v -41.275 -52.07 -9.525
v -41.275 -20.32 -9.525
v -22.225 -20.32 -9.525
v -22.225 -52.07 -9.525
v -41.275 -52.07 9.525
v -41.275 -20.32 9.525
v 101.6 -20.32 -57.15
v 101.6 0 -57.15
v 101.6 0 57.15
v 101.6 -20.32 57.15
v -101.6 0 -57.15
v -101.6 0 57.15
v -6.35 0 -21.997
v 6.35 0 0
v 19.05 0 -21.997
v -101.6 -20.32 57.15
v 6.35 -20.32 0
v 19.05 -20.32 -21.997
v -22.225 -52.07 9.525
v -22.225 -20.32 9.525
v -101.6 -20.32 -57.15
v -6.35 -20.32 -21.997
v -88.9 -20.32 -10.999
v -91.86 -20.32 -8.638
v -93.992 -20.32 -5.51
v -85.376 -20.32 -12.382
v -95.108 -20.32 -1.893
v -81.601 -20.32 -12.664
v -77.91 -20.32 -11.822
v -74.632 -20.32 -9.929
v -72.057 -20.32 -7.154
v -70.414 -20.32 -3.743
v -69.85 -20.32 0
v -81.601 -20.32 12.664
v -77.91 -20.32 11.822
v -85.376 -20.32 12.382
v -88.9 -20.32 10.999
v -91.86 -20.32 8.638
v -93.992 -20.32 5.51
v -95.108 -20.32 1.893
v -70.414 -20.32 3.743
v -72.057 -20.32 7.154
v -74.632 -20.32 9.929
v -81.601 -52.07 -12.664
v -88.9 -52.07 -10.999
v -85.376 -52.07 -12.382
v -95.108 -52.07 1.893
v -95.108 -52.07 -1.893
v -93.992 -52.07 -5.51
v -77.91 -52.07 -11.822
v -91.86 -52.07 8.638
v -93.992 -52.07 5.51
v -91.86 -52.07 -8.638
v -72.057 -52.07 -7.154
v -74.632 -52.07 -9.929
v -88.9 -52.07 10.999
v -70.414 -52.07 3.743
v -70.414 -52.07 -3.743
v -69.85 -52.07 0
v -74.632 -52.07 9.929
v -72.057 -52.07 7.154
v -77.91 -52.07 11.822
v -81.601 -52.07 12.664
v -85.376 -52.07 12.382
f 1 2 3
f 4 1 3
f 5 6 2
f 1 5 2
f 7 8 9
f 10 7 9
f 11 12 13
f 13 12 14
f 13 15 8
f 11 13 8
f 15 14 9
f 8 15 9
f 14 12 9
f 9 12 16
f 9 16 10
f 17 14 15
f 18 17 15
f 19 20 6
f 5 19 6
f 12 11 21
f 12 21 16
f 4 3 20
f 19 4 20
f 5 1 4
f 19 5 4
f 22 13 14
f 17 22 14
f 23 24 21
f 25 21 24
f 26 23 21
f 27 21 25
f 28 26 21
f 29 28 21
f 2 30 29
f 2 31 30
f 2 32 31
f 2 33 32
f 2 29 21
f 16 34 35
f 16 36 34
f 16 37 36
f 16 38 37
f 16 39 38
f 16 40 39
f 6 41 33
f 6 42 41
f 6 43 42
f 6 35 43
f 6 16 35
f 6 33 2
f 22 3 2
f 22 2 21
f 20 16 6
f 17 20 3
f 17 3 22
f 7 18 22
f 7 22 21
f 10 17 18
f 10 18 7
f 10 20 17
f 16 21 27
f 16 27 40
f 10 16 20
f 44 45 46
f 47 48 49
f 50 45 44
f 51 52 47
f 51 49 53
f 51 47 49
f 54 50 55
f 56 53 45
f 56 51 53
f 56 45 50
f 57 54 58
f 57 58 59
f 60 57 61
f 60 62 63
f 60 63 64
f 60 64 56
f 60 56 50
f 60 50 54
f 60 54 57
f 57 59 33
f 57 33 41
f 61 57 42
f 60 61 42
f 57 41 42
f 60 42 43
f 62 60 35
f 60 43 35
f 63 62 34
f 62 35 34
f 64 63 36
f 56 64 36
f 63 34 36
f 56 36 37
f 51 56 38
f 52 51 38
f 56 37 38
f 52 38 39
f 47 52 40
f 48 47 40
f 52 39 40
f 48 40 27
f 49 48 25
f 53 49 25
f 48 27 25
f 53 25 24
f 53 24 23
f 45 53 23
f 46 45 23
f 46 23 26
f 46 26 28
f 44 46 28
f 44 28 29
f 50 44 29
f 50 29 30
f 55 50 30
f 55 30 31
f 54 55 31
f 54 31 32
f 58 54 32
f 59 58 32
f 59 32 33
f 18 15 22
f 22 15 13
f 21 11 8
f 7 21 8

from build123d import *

# Parameters (mm, degrees)
F0_W     = 203.2
F0_H     = 114.3
F0_R     = 12.7
F1_DEPTH = 20.32
F2_DEPTH = 52.07


with BuildPart() as f1:
    # F0 (on Front) → F1 (new body)
    with BuildSketch(Plane.XZ):
        Rectangle(F0_W, F0_H)
        Polygon((-6.35, -21.997045), (6.35, 0), (19.05, -21.997045), align=None, mode=Mode.SUBTRACT)
        with Locations((-82.55, 0)):
            Circle(F0_R, mode=Mode.SUBTRACT)
        Polygon((-22.225, 9.525), (-22.225, 0), (-22.225, -9.525), (-41.275, -9.525), (-41.275, 0), (-41.275, 9.525), align=None, mode=Mode.SUBTRACT)
    extrude(amount=F1_DEPTH)

    # F0 (on Front) → F2 (join)
    with BuildSketch(Plane.XZ):
        with Locations((-82.55, 0)):
            Circle(F0_R)
        Polygon((-31.75, 0), (-22.225, 0), (-22.225, 9.525), (-41.275, 9.525), (-41.275, 0), align=None)
        Polygon((-22.225, -9.525), (-22.225, 0), (-31.75, 0), (-41.275, 0), (-41.275, -9.525), align=None)
    extrude(amount=F2_DEPTH)


solid = f1.part
